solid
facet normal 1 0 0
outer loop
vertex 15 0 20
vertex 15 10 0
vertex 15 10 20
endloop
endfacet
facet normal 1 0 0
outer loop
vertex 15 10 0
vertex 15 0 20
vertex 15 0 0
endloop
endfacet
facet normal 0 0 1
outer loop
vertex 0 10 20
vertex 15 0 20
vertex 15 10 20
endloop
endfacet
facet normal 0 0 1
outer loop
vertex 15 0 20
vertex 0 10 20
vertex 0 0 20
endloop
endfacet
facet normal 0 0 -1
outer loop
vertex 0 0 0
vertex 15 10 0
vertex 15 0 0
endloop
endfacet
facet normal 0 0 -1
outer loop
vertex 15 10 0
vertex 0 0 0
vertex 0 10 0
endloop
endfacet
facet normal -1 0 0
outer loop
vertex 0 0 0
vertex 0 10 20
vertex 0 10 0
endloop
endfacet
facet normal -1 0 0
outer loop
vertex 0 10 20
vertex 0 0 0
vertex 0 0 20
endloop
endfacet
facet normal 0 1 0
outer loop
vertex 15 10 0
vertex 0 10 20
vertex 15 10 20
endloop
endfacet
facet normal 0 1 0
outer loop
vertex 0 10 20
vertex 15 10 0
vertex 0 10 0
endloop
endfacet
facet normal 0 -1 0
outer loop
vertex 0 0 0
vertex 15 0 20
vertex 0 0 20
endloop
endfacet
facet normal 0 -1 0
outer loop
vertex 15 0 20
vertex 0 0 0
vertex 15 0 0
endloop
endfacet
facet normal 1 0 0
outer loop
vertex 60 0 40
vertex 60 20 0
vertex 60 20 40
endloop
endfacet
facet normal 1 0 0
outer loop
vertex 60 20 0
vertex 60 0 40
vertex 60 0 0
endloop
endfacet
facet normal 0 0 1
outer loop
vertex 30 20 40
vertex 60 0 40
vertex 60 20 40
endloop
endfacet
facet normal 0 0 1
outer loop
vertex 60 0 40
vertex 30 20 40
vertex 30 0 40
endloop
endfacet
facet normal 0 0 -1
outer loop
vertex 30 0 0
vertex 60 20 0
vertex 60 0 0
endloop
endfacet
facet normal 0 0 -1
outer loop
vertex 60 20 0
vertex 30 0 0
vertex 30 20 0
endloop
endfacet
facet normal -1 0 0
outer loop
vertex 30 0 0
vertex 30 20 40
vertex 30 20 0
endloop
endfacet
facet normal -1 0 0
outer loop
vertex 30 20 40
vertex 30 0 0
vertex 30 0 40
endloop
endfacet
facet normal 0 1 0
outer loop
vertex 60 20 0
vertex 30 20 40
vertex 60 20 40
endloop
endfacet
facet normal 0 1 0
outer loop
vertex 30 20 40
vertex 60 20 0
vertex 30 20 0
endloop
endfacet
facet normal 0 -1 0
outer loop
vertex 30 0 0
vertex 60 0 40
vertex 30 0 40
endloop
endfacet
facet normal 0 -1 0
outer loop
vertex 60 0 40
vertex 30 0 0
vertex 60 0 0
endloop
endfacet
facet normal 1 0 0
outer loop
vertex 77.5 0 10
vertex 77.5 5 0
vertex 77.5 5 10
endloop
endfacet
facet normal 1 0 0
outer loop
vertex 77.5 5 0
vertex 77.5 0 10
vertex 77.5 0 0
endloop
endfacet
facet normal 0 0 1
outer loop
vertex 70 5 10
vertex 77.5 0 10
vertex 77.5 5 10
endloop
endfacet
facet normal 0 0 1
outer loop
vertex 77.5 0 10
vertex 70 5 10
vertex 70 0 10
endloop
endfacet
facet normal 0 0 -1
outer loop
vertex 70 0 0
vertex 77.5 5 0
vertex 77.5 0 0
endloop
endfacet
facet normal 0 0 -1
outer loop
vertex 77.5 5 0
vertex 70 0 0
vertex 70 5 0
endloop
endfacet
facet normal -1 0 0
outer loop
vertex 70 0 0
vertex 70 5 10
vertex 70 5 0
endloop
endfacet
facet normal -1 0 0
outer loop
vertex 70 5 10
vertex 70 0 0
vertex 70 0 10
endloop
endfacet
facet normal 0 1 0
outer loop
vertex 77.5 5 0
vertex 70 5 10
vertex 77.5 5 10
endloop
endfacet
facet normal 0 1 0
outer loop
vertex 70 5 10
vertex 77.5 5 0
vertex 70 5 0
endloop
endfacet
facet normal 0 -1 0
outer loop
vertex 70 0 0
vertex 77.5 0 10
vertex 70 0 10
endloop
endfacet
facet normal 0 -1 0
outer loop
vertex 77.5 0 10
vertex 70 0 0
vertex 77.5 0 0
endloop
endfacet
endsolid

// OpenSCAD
module box(scale) {
  cube([15*scale, 10*scale, 20*scale]);
}

box(1);
translate([30, 0, 0]) box(2);
translate([70, 0, 0]) box(0.5);
